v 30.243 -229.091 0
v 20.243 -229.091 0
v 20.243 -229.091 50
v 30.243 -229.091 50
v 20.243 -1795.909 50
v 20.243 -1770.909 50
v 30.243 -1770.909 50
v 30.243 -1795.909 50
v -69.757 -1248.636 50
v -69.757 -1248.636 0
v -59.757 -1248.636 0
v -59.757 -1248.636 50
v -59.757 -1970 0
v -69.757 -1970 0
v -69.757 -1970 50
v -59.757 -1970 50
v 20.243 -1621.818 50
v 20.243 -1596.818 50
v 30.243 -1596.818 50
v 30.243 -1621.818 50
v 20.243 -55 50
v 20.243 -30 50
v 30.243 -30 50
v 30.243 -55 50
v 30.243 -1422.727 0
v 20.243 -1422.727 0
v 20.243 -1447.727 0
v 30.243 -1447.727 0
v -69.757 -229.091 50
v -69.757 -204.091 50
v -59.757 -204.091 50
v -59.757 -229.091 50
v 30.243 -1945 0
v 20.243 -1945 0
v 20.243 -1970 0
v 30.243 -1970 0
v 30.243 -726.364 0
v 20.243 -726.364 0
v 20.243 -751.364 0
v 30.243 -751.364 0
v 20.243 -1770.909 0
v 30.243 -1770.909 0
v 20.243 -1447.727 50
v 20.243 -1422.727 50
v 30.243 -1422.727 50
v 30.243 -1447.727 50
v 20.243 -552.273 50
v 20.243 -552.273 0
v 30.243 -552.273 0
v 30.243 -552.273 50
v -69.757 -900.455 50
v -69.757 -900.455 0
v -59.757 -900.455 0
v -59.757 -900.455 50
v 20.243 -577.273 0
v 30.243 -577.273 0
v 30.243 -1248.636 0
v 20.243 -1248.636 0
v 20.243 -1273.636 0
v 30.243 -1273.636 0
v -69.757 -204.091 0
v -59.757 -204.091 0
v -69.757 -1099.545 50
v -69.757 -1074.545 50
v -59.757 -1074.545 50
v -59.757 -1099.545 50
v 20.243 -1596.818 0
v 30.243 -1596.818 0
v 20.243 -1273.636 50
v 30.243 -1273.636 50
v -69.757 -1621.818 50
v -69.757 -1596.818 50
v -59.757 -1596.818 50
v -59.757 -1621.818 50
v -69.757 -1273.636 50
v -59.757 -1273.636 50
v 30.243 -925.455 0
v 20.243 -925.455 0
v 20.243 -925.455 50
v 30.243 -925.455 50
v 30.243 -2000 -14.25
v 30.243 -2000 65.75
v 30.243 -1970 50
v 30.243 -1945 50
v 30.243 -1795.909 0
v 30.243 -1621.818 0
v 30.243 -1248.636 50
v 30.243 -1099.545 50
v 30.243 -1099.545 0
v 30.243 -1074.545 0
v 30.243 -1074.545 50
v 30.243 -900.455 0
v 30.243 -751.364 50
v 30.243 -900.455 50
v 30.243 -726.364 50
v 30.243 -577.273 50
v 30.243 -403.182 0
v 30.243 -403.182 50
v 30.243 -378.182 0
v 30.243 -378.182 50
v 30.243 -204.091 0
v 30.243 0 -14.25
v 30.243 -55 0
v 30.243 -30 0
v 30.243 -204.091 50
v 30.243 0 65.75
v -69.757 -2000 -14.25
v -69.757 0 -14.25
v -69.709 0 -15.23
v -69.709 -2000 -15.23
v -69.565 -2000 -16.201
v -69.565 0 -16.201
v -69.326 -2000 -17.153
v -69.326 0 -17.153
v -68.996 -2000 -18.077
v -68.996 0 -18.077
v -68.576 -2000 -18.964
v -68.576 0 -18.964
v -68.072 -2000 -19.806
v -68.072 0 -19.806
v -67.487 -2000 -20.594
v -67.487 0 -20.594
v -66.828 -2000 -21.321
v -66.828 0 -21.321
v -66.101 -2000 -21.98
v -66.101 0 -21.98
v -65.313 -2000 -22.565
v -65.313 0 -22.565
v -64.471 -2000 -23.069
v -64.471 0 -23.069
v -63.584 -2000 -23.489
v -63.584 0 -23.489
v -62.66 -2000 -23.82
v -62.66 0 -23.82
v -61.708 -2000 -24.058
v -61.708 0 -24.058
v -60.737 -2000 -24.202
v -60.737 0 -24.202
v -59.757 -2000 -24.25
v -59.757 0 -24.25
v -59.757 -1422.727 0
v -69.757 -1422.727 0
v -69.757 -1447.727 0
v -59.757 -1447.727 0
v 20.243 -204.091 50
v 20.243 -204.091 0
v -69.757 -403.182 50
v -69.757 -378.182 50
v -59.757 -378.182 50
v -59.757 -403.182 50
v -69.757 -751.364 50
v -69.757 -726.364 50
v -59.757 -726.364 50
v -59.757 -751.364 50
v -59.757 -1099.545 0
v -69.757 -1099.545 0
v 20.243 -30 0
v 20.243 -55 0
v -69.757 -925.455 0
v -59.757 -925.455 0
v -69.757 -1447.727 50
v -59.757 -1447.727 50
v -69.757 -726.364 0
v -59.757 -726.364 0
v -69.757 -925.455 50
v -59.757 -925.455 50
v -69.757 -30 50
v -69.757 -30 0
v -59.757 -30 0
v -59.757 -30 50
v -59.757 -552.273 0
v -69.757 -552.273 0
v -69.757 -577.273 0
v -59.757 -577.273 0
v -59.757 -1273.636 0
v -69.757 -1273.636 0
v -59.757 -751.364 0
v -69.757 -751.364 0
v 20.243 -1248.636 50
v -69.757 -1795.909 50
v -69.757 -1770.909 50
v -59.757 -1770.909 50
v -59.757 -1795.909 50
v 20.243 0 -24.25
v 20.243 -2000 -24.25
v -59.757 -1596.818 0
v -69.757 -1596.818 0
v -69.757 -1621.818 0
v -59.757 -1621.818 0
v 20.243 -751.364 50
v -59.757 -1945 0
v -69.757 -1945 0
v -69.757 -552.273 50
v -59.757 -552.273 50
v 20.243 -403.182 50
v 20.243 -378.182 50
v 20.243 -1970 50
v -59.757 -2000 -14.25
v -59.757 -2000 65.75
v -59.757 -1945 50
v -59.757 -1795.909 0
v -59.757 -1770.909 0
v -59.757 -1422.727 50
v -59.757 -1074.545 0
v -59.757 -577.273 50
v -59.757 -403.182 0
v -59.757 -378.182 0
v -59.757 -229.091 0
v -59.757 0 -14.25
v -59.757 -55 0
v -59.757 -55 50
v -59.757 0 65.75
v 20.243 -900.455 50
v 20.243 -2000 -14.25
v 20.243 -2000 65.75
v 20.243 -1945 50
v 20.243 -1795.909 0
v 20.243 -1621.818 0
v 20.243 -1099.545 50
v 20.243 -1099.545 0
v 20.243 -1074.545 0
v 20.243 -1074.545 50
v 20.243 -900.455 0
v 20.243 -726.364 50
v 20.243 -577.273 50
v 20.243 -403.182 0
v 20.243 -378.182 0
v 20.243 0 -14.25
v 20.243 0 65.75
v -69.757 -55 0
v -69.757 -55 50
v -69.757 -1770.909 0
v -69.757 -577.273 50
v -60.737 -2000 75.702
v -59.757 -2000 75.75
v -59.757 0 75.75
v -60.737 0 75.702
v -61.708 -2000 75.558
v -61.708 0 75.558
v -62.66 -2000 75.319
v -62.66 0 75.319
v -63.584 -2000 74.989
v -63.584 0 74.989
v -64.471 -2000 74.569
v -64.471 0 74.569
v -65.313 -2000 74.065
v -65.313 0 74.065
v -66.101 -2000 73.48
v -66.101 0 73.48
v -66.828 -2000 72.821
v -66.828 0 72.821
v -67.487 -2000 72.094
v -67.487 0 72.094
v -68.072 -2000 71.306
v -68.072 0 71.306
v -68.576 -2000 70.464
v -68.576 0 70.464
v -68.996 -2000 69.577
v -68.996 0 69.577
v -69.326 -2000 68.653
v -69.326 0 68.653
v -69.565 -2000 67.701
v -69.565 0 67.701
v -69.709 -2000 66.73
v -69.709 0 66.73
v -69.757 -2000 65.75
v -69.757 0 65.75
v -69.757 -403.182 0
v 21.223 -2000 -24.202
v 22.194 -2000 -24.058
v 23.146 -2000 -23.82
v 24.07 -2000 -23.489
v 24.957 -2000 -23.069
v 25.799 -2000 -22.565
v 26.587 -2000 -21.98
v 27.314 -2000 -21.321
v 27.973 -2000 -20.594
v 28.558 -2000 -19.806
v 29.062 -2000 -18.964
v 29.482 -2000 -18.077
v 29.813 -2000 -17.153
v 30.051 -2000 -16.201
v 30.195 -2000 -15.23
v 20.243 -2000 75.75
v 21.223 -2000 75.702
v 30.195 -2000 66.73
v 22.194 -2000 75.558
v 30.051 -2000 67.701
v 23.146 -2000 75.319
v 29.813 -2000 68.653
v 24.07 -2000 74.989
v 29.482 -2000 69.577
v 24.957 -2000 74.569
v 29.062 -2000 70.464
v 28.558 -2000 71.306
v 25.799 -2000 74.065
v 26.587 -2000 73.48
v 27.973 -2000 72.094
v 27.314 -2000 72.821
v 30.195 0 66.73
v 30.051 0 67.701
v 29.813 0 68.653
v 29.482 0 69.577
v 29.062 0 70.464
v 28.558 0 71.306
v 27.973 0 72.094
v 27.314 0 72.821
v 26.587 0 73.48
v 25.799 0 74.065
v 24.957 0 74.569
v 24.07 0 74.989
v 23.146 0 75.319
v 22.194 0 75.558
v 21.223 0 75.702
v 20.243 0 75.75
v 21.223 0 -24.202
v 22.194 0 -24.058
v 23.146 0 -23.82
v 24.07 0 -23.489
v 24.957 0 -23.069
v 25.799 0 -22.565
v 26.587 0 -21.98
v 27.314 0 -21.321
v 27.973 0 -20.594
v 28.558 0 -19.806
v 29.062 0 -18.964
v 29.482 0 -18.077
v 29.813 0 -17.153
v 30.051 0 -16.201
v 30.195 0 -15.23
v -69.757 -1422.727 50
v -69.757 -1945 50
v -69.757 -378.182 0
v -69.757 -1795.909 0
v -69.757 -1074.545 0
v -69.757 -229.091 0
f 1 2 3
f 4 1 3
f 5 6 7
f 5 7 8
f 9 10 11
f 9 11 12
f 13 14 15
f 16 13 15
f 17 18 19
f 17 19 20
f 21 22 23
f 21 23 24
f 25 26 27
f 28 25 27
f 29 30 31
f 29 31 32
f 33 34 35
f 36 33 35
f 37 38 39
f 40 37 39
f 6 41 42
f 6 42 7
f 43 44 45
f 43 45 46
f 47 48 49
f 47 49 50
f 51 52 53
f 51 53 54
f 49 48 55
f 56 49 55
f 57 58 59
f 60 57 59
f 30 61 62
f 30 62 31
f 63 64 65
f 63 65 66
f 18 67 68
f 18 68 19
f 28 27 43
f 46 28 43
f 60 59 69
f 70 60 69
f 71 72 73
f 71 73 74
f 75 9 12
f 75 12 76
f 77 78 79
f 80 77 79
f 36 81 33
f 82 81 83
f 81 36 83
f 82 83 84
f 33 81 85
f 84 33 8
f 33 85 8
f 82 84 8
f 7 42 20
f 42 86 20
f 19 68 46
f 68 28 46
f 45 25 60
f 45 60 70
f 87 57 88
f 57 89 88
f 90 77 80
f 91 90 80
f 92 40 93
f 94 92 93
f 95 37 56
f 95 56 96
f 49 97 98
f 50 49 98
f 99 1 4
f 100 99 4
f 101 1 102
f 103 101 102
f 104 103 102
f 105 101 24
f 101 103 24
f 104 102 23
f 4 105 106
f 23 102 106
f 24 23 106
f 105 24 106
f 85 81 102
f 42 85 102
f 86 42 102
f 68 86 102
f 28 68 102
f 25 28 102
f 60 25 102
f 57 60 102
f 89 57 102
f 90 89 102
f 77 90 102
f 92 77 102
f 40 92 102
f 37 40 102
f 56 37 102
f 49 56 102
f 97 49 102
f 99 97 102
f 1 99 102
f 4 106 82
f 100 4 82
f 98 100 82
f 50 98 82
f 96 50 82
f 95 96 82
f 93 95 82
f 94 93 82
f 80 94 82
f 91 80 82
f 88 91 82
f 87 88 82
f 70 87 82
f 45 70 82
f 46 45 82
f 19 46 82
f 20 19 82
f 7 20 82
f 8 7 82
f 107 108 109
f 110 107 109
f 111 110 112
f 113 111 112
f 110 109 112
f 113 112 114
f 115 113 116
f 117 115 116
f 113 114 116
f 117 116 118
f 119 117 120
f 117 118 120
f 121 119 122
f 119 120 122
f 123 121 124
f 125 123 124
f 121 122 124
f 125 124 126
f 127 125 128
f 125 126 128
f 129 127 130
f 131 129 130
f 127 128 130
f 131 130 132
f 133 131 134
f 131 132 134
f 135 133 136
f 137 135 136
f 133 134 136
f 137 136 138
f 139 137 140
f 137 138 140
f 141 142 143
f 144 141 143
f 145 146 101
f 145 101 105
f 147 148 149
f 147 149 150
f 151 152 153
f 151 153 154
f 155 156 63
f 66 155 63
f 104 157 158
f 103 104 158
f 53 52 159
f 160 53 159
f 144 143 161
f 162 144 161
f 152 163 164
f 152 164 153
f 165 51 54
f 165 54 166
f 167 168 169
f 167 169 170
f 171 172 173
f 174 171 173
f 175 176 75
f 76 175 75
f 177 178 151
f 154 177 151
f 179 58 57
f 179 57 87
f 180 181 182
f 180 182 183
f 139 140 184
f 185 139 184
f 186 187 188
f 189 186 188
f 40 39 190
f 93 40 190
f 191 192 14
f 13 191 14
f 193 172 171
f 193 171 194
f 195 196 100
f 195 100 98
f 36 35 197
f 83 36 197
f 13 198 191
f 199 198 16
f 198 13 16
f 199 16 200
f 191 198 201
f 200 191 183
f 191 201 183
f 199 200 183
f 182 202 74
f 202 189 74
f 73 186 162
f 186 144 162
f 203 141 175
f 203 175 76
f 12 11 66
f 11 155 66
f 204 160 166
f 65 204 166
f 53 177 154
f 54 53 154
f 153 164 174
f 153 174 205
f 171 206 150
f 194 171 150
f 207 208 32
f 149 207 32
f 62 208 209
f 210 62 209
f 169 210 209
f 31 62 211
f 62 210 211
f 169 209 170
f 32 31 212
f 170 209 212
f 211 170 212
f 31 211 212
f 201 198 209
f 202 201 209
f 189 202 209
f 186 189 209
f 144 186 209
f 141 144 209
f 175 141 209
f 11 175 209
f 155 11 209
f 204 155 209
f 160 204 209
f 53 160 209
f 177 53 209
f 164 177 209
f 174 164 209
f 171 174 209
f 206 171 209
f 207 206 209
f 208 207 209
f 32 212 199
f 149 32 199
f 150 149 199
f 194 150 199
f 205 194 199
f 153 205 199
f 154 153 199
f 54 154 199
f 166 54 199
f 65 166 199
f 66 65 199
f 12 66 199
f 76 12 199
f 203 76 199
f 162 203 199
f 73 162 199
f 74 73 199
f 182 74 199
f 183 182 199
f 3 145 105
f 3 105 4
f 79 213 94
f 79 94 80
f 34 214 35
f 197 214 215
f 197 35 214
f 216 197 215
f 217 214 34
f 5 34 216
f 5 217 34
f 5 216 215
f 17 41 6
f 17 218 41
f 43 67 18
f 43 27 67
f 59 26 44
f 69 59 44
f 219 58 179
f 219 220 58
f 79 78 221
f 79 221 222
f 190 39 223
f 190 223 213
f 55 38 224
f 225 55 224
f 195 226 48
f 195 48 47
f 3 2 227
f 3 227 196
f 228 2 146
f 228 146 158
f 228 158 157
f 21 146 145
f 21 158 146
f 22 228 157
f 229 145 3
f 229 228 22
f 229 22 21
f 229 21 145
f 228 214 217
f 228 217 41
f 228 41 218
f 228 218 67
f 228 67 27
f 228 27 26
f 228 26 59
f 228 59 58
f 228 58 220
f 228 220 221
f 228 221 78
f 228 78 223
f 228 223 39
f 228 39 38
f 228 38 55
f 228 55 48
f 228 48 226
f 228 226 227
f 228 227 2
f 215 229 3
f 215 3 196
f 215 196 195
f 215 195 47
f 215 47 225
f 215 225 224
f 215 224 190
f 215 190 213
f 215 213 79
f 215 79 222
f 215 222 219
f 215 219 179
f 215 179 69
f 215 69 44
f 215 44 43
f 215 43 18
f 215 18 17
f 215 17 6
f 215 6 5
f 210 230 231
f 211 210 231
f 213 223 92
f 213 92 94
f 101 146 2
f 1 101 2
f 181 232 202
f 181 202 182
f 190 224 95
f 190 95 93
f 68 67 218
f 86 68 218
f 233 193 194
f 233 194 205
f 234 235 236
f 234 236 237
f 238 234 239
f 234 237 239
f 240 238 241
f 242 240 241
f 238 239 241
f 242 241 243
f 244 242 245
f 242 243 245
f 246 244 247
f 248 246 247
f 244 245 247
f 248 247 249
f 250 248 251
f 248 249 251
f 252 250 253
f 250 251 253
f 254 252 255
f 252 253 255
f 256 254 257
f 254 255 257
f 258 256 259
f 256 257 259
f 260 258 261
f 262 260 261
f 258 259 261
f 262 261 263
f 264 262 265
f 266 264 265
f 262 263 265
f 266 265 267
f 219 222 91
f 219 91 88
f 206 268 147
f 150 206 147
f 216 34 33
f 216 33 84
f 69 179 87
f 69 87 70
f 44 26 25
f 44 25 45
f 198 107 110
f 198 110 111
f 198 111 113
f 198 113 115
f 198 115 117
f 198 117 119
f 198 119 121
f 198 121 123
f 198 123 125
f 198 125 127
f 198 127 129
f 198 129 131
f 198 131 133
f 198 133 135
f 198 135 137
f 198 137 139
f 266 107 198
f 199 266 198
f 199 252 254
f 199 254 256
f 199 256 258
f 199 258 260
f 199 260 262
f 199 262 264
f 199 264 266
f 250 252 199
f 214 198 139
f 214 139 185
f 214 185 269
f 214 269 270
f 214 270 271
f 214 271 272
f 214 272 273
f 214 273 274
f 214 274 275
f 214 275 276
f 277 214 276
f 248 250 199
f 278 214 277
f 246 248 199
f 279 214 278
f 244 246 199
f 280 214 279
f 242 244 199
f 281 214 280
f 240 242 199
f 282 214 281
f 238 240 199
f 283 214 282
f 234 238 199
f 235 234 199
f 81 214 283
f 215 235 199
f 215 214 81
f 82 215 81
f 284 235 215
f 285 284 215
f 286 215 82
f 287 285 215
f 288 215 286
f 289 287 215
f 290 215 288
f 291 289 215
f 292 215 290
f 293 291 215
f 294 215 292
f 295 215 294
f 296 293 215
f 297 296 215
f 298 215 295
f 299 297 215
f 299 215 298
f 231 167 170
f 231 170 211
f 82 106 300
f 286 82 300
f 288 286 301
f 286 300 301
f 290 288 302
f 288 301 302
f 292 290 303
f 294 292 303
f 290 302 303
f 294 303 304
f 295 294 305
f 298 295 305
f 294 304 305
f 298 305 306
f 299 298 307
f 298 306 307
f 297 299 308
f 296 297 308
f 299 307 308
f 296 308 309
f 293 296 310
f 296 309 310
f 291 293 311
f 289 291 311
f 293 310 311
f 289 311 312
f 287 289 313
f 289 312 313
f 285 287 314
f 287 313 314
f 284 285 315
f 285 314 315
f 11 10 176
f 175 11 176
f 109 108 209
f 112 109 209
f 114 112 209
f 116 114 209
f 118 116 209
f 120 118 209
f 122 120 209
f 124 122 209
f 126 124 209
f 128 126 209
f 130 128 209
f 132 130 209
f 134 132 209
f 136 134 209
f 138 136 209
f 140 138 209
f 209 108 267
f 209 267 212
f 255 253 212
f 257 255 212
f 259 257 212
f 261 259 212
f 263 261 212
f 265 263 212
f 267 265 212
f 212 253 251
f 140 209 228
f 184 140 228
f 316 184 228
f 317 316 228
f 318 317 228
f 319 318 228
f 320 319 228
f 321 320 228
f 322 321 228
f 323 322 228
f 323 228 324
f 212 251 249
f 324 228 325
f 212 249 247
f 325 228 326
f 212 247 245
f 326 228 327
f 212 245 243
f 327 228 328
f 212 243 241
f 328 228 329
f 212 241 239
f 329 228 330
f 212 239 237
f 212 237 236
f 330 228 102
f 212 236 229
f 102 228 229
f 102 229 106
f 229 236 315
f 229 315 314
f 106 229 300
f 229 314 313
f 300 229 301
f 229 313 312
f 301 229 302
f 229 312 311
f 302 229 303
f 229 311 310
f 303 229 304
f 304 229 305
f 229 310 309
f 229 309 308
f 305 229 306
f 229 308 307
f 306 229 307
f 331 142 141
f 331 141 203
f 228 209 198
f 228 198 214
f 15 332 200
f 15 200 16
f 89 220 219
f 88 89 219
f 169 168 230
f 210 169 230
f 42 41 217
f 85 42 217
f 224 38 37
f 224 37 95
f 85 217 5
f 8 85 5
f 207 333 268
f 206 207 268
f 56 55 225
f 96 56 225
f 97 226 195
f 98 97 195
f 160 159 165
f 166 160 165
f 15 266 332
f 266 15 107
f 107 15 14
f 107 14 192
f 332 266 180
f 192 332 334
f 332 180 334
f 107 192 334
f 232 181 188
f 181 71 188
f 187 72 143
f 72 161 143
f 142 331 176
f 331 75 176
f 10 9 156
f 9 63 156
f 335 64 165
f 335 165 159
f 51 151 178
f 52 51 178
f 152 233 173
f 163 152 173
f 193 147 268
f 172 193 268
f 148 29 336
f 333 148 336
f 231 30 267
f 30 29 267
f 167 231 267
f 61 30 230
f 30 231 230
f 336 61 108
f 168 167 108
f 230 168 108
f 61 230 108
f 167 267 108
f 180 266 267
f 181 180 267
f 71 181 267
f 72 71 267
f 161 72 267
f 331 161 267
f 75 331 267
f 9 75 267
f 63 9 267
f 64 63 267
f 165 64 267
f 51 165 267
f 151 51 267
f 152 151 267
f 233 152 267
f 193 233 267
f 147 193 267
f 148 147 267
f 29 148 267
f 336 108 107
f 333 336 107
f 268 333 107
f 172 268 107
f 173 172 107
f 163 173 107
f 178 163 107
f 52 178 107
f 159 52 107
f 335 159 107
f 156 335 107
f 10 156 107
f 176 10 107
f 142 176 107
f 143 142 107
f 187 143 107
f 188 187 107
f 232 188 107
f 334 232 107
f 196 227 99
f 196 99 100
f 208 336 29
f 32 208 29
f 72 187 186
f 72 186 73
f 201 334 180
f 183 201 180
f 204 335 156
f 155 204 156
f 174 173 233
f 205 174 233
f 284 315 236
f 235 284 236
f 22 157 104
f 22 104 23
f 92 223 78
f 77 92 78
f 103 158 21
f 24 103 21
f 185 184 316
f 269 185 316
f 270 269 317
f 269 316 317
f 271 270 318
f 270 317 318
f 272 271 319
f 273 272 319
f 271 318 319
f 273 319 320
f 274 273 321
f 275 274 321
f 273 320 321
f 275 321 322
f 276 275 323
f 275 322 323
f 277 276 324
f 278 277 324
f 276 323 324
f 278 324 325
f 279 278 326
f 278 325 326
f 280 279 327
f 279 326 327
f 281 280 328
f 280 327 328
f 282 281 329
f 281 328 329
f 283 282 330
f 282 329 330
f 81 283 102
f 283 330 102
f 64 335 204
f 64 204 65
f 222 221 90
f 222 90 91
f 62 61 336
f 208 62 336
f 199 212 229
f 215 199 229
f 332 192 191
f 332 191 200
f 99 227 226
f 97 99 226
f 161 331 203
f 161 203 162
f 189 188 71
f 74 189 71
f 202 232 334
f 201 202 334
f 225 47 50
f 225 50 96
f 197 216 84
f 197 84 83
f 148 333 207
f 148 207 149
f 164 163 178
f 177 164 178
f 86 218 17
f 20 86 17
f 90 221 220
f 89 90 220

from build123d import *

# Parameters (mm, degrees)
F0_W     = 80
F0_H     = 80
F1_DEPTH = 2000
F2_W     = 25
F2_H     = 50
F3_DEPTH = 100


with BuildPart() as f1:
    # F0 (on Front) → F1 (new body)
    with BuildSketch(Plane.XZ):
        with BuildLine():
            Line((20.243097, 75.749835), (-59.756903, 75.749835))
            ThreePointArc((-59.756903, 75.749835), (-66.827971, 72.820903), (-69.756903, 65.749835))
            Line((-69.756903, 65.749835), (-69.756903, -14.250165))
            ThreePointArc((-69.756903, -14.250165), (-66.827971, -21.321233), (-59.756903, -24.250165))
            Line((-59.756903, -24.250165), (20.243097, -24.250165))
            ThreePointArc((20.243097, -24.250165), (27.314164, -21.321233), (30.243097, -14.250165))
            Line((30.243097, -14.250165), (30.243097, 65.749835))
            ThreePointArc((30.243097, 65.749835), (27.314164, 72.820903), (20.243097, 75.749835))
        make_face()
        with Locations((-19.756903, 25.749835)):
            Rectangle(F0_W, F0_H, mode=Mode.SUBTRACT)
    extrude(amount=F1_DEPTH)

    # F2 (on face) → F3 (cut)
    with BuildSketch(Plane(origin=(-69.756903, 0, 0), x_dir=(0, -1, 0), z_dir=(-1, 0, 0))):
        with Locations((42.5, 25)):
            Rectangle(F2_W, F2_H)
        with Locations((216.591, 25)):
            Rectangle(F2_W, F2_H)
        with Locations((390.682, 25)):
            Rectangle(F2_W, F2_H)
        with Locations((564.773, 25)):
            Rectangle(F2_W, F2_H)
        with Locations((1957.5, 25)):
            Rectangle(F2_W, F2_H)
        with Locations((738.864, 25)):
            Rectangle(F2_W, F2_H)
        with Locations((912.955, 25)):
            Rectangle(F2_W, F2_H)
        with Locations((1087.045, 25)):
            Rectangle(F2_W, F2_H)
        with Locations((1261.136, 25)):
            Rectangle(F2_W, F2_H)
        with Locations((1435.227, 25)):
            Rectangle(F2_W, F2_H)
        with Locations((1609.318, 25)):
            Rectangle(F2_W, F2_H)
        with Locations((1783.409, 25)):
            Rectangle(F2_W, F2_H)
    extrude(amount=-F3_DEPTH, mode=Mode.SUBTRACT)


solid = f1.part
